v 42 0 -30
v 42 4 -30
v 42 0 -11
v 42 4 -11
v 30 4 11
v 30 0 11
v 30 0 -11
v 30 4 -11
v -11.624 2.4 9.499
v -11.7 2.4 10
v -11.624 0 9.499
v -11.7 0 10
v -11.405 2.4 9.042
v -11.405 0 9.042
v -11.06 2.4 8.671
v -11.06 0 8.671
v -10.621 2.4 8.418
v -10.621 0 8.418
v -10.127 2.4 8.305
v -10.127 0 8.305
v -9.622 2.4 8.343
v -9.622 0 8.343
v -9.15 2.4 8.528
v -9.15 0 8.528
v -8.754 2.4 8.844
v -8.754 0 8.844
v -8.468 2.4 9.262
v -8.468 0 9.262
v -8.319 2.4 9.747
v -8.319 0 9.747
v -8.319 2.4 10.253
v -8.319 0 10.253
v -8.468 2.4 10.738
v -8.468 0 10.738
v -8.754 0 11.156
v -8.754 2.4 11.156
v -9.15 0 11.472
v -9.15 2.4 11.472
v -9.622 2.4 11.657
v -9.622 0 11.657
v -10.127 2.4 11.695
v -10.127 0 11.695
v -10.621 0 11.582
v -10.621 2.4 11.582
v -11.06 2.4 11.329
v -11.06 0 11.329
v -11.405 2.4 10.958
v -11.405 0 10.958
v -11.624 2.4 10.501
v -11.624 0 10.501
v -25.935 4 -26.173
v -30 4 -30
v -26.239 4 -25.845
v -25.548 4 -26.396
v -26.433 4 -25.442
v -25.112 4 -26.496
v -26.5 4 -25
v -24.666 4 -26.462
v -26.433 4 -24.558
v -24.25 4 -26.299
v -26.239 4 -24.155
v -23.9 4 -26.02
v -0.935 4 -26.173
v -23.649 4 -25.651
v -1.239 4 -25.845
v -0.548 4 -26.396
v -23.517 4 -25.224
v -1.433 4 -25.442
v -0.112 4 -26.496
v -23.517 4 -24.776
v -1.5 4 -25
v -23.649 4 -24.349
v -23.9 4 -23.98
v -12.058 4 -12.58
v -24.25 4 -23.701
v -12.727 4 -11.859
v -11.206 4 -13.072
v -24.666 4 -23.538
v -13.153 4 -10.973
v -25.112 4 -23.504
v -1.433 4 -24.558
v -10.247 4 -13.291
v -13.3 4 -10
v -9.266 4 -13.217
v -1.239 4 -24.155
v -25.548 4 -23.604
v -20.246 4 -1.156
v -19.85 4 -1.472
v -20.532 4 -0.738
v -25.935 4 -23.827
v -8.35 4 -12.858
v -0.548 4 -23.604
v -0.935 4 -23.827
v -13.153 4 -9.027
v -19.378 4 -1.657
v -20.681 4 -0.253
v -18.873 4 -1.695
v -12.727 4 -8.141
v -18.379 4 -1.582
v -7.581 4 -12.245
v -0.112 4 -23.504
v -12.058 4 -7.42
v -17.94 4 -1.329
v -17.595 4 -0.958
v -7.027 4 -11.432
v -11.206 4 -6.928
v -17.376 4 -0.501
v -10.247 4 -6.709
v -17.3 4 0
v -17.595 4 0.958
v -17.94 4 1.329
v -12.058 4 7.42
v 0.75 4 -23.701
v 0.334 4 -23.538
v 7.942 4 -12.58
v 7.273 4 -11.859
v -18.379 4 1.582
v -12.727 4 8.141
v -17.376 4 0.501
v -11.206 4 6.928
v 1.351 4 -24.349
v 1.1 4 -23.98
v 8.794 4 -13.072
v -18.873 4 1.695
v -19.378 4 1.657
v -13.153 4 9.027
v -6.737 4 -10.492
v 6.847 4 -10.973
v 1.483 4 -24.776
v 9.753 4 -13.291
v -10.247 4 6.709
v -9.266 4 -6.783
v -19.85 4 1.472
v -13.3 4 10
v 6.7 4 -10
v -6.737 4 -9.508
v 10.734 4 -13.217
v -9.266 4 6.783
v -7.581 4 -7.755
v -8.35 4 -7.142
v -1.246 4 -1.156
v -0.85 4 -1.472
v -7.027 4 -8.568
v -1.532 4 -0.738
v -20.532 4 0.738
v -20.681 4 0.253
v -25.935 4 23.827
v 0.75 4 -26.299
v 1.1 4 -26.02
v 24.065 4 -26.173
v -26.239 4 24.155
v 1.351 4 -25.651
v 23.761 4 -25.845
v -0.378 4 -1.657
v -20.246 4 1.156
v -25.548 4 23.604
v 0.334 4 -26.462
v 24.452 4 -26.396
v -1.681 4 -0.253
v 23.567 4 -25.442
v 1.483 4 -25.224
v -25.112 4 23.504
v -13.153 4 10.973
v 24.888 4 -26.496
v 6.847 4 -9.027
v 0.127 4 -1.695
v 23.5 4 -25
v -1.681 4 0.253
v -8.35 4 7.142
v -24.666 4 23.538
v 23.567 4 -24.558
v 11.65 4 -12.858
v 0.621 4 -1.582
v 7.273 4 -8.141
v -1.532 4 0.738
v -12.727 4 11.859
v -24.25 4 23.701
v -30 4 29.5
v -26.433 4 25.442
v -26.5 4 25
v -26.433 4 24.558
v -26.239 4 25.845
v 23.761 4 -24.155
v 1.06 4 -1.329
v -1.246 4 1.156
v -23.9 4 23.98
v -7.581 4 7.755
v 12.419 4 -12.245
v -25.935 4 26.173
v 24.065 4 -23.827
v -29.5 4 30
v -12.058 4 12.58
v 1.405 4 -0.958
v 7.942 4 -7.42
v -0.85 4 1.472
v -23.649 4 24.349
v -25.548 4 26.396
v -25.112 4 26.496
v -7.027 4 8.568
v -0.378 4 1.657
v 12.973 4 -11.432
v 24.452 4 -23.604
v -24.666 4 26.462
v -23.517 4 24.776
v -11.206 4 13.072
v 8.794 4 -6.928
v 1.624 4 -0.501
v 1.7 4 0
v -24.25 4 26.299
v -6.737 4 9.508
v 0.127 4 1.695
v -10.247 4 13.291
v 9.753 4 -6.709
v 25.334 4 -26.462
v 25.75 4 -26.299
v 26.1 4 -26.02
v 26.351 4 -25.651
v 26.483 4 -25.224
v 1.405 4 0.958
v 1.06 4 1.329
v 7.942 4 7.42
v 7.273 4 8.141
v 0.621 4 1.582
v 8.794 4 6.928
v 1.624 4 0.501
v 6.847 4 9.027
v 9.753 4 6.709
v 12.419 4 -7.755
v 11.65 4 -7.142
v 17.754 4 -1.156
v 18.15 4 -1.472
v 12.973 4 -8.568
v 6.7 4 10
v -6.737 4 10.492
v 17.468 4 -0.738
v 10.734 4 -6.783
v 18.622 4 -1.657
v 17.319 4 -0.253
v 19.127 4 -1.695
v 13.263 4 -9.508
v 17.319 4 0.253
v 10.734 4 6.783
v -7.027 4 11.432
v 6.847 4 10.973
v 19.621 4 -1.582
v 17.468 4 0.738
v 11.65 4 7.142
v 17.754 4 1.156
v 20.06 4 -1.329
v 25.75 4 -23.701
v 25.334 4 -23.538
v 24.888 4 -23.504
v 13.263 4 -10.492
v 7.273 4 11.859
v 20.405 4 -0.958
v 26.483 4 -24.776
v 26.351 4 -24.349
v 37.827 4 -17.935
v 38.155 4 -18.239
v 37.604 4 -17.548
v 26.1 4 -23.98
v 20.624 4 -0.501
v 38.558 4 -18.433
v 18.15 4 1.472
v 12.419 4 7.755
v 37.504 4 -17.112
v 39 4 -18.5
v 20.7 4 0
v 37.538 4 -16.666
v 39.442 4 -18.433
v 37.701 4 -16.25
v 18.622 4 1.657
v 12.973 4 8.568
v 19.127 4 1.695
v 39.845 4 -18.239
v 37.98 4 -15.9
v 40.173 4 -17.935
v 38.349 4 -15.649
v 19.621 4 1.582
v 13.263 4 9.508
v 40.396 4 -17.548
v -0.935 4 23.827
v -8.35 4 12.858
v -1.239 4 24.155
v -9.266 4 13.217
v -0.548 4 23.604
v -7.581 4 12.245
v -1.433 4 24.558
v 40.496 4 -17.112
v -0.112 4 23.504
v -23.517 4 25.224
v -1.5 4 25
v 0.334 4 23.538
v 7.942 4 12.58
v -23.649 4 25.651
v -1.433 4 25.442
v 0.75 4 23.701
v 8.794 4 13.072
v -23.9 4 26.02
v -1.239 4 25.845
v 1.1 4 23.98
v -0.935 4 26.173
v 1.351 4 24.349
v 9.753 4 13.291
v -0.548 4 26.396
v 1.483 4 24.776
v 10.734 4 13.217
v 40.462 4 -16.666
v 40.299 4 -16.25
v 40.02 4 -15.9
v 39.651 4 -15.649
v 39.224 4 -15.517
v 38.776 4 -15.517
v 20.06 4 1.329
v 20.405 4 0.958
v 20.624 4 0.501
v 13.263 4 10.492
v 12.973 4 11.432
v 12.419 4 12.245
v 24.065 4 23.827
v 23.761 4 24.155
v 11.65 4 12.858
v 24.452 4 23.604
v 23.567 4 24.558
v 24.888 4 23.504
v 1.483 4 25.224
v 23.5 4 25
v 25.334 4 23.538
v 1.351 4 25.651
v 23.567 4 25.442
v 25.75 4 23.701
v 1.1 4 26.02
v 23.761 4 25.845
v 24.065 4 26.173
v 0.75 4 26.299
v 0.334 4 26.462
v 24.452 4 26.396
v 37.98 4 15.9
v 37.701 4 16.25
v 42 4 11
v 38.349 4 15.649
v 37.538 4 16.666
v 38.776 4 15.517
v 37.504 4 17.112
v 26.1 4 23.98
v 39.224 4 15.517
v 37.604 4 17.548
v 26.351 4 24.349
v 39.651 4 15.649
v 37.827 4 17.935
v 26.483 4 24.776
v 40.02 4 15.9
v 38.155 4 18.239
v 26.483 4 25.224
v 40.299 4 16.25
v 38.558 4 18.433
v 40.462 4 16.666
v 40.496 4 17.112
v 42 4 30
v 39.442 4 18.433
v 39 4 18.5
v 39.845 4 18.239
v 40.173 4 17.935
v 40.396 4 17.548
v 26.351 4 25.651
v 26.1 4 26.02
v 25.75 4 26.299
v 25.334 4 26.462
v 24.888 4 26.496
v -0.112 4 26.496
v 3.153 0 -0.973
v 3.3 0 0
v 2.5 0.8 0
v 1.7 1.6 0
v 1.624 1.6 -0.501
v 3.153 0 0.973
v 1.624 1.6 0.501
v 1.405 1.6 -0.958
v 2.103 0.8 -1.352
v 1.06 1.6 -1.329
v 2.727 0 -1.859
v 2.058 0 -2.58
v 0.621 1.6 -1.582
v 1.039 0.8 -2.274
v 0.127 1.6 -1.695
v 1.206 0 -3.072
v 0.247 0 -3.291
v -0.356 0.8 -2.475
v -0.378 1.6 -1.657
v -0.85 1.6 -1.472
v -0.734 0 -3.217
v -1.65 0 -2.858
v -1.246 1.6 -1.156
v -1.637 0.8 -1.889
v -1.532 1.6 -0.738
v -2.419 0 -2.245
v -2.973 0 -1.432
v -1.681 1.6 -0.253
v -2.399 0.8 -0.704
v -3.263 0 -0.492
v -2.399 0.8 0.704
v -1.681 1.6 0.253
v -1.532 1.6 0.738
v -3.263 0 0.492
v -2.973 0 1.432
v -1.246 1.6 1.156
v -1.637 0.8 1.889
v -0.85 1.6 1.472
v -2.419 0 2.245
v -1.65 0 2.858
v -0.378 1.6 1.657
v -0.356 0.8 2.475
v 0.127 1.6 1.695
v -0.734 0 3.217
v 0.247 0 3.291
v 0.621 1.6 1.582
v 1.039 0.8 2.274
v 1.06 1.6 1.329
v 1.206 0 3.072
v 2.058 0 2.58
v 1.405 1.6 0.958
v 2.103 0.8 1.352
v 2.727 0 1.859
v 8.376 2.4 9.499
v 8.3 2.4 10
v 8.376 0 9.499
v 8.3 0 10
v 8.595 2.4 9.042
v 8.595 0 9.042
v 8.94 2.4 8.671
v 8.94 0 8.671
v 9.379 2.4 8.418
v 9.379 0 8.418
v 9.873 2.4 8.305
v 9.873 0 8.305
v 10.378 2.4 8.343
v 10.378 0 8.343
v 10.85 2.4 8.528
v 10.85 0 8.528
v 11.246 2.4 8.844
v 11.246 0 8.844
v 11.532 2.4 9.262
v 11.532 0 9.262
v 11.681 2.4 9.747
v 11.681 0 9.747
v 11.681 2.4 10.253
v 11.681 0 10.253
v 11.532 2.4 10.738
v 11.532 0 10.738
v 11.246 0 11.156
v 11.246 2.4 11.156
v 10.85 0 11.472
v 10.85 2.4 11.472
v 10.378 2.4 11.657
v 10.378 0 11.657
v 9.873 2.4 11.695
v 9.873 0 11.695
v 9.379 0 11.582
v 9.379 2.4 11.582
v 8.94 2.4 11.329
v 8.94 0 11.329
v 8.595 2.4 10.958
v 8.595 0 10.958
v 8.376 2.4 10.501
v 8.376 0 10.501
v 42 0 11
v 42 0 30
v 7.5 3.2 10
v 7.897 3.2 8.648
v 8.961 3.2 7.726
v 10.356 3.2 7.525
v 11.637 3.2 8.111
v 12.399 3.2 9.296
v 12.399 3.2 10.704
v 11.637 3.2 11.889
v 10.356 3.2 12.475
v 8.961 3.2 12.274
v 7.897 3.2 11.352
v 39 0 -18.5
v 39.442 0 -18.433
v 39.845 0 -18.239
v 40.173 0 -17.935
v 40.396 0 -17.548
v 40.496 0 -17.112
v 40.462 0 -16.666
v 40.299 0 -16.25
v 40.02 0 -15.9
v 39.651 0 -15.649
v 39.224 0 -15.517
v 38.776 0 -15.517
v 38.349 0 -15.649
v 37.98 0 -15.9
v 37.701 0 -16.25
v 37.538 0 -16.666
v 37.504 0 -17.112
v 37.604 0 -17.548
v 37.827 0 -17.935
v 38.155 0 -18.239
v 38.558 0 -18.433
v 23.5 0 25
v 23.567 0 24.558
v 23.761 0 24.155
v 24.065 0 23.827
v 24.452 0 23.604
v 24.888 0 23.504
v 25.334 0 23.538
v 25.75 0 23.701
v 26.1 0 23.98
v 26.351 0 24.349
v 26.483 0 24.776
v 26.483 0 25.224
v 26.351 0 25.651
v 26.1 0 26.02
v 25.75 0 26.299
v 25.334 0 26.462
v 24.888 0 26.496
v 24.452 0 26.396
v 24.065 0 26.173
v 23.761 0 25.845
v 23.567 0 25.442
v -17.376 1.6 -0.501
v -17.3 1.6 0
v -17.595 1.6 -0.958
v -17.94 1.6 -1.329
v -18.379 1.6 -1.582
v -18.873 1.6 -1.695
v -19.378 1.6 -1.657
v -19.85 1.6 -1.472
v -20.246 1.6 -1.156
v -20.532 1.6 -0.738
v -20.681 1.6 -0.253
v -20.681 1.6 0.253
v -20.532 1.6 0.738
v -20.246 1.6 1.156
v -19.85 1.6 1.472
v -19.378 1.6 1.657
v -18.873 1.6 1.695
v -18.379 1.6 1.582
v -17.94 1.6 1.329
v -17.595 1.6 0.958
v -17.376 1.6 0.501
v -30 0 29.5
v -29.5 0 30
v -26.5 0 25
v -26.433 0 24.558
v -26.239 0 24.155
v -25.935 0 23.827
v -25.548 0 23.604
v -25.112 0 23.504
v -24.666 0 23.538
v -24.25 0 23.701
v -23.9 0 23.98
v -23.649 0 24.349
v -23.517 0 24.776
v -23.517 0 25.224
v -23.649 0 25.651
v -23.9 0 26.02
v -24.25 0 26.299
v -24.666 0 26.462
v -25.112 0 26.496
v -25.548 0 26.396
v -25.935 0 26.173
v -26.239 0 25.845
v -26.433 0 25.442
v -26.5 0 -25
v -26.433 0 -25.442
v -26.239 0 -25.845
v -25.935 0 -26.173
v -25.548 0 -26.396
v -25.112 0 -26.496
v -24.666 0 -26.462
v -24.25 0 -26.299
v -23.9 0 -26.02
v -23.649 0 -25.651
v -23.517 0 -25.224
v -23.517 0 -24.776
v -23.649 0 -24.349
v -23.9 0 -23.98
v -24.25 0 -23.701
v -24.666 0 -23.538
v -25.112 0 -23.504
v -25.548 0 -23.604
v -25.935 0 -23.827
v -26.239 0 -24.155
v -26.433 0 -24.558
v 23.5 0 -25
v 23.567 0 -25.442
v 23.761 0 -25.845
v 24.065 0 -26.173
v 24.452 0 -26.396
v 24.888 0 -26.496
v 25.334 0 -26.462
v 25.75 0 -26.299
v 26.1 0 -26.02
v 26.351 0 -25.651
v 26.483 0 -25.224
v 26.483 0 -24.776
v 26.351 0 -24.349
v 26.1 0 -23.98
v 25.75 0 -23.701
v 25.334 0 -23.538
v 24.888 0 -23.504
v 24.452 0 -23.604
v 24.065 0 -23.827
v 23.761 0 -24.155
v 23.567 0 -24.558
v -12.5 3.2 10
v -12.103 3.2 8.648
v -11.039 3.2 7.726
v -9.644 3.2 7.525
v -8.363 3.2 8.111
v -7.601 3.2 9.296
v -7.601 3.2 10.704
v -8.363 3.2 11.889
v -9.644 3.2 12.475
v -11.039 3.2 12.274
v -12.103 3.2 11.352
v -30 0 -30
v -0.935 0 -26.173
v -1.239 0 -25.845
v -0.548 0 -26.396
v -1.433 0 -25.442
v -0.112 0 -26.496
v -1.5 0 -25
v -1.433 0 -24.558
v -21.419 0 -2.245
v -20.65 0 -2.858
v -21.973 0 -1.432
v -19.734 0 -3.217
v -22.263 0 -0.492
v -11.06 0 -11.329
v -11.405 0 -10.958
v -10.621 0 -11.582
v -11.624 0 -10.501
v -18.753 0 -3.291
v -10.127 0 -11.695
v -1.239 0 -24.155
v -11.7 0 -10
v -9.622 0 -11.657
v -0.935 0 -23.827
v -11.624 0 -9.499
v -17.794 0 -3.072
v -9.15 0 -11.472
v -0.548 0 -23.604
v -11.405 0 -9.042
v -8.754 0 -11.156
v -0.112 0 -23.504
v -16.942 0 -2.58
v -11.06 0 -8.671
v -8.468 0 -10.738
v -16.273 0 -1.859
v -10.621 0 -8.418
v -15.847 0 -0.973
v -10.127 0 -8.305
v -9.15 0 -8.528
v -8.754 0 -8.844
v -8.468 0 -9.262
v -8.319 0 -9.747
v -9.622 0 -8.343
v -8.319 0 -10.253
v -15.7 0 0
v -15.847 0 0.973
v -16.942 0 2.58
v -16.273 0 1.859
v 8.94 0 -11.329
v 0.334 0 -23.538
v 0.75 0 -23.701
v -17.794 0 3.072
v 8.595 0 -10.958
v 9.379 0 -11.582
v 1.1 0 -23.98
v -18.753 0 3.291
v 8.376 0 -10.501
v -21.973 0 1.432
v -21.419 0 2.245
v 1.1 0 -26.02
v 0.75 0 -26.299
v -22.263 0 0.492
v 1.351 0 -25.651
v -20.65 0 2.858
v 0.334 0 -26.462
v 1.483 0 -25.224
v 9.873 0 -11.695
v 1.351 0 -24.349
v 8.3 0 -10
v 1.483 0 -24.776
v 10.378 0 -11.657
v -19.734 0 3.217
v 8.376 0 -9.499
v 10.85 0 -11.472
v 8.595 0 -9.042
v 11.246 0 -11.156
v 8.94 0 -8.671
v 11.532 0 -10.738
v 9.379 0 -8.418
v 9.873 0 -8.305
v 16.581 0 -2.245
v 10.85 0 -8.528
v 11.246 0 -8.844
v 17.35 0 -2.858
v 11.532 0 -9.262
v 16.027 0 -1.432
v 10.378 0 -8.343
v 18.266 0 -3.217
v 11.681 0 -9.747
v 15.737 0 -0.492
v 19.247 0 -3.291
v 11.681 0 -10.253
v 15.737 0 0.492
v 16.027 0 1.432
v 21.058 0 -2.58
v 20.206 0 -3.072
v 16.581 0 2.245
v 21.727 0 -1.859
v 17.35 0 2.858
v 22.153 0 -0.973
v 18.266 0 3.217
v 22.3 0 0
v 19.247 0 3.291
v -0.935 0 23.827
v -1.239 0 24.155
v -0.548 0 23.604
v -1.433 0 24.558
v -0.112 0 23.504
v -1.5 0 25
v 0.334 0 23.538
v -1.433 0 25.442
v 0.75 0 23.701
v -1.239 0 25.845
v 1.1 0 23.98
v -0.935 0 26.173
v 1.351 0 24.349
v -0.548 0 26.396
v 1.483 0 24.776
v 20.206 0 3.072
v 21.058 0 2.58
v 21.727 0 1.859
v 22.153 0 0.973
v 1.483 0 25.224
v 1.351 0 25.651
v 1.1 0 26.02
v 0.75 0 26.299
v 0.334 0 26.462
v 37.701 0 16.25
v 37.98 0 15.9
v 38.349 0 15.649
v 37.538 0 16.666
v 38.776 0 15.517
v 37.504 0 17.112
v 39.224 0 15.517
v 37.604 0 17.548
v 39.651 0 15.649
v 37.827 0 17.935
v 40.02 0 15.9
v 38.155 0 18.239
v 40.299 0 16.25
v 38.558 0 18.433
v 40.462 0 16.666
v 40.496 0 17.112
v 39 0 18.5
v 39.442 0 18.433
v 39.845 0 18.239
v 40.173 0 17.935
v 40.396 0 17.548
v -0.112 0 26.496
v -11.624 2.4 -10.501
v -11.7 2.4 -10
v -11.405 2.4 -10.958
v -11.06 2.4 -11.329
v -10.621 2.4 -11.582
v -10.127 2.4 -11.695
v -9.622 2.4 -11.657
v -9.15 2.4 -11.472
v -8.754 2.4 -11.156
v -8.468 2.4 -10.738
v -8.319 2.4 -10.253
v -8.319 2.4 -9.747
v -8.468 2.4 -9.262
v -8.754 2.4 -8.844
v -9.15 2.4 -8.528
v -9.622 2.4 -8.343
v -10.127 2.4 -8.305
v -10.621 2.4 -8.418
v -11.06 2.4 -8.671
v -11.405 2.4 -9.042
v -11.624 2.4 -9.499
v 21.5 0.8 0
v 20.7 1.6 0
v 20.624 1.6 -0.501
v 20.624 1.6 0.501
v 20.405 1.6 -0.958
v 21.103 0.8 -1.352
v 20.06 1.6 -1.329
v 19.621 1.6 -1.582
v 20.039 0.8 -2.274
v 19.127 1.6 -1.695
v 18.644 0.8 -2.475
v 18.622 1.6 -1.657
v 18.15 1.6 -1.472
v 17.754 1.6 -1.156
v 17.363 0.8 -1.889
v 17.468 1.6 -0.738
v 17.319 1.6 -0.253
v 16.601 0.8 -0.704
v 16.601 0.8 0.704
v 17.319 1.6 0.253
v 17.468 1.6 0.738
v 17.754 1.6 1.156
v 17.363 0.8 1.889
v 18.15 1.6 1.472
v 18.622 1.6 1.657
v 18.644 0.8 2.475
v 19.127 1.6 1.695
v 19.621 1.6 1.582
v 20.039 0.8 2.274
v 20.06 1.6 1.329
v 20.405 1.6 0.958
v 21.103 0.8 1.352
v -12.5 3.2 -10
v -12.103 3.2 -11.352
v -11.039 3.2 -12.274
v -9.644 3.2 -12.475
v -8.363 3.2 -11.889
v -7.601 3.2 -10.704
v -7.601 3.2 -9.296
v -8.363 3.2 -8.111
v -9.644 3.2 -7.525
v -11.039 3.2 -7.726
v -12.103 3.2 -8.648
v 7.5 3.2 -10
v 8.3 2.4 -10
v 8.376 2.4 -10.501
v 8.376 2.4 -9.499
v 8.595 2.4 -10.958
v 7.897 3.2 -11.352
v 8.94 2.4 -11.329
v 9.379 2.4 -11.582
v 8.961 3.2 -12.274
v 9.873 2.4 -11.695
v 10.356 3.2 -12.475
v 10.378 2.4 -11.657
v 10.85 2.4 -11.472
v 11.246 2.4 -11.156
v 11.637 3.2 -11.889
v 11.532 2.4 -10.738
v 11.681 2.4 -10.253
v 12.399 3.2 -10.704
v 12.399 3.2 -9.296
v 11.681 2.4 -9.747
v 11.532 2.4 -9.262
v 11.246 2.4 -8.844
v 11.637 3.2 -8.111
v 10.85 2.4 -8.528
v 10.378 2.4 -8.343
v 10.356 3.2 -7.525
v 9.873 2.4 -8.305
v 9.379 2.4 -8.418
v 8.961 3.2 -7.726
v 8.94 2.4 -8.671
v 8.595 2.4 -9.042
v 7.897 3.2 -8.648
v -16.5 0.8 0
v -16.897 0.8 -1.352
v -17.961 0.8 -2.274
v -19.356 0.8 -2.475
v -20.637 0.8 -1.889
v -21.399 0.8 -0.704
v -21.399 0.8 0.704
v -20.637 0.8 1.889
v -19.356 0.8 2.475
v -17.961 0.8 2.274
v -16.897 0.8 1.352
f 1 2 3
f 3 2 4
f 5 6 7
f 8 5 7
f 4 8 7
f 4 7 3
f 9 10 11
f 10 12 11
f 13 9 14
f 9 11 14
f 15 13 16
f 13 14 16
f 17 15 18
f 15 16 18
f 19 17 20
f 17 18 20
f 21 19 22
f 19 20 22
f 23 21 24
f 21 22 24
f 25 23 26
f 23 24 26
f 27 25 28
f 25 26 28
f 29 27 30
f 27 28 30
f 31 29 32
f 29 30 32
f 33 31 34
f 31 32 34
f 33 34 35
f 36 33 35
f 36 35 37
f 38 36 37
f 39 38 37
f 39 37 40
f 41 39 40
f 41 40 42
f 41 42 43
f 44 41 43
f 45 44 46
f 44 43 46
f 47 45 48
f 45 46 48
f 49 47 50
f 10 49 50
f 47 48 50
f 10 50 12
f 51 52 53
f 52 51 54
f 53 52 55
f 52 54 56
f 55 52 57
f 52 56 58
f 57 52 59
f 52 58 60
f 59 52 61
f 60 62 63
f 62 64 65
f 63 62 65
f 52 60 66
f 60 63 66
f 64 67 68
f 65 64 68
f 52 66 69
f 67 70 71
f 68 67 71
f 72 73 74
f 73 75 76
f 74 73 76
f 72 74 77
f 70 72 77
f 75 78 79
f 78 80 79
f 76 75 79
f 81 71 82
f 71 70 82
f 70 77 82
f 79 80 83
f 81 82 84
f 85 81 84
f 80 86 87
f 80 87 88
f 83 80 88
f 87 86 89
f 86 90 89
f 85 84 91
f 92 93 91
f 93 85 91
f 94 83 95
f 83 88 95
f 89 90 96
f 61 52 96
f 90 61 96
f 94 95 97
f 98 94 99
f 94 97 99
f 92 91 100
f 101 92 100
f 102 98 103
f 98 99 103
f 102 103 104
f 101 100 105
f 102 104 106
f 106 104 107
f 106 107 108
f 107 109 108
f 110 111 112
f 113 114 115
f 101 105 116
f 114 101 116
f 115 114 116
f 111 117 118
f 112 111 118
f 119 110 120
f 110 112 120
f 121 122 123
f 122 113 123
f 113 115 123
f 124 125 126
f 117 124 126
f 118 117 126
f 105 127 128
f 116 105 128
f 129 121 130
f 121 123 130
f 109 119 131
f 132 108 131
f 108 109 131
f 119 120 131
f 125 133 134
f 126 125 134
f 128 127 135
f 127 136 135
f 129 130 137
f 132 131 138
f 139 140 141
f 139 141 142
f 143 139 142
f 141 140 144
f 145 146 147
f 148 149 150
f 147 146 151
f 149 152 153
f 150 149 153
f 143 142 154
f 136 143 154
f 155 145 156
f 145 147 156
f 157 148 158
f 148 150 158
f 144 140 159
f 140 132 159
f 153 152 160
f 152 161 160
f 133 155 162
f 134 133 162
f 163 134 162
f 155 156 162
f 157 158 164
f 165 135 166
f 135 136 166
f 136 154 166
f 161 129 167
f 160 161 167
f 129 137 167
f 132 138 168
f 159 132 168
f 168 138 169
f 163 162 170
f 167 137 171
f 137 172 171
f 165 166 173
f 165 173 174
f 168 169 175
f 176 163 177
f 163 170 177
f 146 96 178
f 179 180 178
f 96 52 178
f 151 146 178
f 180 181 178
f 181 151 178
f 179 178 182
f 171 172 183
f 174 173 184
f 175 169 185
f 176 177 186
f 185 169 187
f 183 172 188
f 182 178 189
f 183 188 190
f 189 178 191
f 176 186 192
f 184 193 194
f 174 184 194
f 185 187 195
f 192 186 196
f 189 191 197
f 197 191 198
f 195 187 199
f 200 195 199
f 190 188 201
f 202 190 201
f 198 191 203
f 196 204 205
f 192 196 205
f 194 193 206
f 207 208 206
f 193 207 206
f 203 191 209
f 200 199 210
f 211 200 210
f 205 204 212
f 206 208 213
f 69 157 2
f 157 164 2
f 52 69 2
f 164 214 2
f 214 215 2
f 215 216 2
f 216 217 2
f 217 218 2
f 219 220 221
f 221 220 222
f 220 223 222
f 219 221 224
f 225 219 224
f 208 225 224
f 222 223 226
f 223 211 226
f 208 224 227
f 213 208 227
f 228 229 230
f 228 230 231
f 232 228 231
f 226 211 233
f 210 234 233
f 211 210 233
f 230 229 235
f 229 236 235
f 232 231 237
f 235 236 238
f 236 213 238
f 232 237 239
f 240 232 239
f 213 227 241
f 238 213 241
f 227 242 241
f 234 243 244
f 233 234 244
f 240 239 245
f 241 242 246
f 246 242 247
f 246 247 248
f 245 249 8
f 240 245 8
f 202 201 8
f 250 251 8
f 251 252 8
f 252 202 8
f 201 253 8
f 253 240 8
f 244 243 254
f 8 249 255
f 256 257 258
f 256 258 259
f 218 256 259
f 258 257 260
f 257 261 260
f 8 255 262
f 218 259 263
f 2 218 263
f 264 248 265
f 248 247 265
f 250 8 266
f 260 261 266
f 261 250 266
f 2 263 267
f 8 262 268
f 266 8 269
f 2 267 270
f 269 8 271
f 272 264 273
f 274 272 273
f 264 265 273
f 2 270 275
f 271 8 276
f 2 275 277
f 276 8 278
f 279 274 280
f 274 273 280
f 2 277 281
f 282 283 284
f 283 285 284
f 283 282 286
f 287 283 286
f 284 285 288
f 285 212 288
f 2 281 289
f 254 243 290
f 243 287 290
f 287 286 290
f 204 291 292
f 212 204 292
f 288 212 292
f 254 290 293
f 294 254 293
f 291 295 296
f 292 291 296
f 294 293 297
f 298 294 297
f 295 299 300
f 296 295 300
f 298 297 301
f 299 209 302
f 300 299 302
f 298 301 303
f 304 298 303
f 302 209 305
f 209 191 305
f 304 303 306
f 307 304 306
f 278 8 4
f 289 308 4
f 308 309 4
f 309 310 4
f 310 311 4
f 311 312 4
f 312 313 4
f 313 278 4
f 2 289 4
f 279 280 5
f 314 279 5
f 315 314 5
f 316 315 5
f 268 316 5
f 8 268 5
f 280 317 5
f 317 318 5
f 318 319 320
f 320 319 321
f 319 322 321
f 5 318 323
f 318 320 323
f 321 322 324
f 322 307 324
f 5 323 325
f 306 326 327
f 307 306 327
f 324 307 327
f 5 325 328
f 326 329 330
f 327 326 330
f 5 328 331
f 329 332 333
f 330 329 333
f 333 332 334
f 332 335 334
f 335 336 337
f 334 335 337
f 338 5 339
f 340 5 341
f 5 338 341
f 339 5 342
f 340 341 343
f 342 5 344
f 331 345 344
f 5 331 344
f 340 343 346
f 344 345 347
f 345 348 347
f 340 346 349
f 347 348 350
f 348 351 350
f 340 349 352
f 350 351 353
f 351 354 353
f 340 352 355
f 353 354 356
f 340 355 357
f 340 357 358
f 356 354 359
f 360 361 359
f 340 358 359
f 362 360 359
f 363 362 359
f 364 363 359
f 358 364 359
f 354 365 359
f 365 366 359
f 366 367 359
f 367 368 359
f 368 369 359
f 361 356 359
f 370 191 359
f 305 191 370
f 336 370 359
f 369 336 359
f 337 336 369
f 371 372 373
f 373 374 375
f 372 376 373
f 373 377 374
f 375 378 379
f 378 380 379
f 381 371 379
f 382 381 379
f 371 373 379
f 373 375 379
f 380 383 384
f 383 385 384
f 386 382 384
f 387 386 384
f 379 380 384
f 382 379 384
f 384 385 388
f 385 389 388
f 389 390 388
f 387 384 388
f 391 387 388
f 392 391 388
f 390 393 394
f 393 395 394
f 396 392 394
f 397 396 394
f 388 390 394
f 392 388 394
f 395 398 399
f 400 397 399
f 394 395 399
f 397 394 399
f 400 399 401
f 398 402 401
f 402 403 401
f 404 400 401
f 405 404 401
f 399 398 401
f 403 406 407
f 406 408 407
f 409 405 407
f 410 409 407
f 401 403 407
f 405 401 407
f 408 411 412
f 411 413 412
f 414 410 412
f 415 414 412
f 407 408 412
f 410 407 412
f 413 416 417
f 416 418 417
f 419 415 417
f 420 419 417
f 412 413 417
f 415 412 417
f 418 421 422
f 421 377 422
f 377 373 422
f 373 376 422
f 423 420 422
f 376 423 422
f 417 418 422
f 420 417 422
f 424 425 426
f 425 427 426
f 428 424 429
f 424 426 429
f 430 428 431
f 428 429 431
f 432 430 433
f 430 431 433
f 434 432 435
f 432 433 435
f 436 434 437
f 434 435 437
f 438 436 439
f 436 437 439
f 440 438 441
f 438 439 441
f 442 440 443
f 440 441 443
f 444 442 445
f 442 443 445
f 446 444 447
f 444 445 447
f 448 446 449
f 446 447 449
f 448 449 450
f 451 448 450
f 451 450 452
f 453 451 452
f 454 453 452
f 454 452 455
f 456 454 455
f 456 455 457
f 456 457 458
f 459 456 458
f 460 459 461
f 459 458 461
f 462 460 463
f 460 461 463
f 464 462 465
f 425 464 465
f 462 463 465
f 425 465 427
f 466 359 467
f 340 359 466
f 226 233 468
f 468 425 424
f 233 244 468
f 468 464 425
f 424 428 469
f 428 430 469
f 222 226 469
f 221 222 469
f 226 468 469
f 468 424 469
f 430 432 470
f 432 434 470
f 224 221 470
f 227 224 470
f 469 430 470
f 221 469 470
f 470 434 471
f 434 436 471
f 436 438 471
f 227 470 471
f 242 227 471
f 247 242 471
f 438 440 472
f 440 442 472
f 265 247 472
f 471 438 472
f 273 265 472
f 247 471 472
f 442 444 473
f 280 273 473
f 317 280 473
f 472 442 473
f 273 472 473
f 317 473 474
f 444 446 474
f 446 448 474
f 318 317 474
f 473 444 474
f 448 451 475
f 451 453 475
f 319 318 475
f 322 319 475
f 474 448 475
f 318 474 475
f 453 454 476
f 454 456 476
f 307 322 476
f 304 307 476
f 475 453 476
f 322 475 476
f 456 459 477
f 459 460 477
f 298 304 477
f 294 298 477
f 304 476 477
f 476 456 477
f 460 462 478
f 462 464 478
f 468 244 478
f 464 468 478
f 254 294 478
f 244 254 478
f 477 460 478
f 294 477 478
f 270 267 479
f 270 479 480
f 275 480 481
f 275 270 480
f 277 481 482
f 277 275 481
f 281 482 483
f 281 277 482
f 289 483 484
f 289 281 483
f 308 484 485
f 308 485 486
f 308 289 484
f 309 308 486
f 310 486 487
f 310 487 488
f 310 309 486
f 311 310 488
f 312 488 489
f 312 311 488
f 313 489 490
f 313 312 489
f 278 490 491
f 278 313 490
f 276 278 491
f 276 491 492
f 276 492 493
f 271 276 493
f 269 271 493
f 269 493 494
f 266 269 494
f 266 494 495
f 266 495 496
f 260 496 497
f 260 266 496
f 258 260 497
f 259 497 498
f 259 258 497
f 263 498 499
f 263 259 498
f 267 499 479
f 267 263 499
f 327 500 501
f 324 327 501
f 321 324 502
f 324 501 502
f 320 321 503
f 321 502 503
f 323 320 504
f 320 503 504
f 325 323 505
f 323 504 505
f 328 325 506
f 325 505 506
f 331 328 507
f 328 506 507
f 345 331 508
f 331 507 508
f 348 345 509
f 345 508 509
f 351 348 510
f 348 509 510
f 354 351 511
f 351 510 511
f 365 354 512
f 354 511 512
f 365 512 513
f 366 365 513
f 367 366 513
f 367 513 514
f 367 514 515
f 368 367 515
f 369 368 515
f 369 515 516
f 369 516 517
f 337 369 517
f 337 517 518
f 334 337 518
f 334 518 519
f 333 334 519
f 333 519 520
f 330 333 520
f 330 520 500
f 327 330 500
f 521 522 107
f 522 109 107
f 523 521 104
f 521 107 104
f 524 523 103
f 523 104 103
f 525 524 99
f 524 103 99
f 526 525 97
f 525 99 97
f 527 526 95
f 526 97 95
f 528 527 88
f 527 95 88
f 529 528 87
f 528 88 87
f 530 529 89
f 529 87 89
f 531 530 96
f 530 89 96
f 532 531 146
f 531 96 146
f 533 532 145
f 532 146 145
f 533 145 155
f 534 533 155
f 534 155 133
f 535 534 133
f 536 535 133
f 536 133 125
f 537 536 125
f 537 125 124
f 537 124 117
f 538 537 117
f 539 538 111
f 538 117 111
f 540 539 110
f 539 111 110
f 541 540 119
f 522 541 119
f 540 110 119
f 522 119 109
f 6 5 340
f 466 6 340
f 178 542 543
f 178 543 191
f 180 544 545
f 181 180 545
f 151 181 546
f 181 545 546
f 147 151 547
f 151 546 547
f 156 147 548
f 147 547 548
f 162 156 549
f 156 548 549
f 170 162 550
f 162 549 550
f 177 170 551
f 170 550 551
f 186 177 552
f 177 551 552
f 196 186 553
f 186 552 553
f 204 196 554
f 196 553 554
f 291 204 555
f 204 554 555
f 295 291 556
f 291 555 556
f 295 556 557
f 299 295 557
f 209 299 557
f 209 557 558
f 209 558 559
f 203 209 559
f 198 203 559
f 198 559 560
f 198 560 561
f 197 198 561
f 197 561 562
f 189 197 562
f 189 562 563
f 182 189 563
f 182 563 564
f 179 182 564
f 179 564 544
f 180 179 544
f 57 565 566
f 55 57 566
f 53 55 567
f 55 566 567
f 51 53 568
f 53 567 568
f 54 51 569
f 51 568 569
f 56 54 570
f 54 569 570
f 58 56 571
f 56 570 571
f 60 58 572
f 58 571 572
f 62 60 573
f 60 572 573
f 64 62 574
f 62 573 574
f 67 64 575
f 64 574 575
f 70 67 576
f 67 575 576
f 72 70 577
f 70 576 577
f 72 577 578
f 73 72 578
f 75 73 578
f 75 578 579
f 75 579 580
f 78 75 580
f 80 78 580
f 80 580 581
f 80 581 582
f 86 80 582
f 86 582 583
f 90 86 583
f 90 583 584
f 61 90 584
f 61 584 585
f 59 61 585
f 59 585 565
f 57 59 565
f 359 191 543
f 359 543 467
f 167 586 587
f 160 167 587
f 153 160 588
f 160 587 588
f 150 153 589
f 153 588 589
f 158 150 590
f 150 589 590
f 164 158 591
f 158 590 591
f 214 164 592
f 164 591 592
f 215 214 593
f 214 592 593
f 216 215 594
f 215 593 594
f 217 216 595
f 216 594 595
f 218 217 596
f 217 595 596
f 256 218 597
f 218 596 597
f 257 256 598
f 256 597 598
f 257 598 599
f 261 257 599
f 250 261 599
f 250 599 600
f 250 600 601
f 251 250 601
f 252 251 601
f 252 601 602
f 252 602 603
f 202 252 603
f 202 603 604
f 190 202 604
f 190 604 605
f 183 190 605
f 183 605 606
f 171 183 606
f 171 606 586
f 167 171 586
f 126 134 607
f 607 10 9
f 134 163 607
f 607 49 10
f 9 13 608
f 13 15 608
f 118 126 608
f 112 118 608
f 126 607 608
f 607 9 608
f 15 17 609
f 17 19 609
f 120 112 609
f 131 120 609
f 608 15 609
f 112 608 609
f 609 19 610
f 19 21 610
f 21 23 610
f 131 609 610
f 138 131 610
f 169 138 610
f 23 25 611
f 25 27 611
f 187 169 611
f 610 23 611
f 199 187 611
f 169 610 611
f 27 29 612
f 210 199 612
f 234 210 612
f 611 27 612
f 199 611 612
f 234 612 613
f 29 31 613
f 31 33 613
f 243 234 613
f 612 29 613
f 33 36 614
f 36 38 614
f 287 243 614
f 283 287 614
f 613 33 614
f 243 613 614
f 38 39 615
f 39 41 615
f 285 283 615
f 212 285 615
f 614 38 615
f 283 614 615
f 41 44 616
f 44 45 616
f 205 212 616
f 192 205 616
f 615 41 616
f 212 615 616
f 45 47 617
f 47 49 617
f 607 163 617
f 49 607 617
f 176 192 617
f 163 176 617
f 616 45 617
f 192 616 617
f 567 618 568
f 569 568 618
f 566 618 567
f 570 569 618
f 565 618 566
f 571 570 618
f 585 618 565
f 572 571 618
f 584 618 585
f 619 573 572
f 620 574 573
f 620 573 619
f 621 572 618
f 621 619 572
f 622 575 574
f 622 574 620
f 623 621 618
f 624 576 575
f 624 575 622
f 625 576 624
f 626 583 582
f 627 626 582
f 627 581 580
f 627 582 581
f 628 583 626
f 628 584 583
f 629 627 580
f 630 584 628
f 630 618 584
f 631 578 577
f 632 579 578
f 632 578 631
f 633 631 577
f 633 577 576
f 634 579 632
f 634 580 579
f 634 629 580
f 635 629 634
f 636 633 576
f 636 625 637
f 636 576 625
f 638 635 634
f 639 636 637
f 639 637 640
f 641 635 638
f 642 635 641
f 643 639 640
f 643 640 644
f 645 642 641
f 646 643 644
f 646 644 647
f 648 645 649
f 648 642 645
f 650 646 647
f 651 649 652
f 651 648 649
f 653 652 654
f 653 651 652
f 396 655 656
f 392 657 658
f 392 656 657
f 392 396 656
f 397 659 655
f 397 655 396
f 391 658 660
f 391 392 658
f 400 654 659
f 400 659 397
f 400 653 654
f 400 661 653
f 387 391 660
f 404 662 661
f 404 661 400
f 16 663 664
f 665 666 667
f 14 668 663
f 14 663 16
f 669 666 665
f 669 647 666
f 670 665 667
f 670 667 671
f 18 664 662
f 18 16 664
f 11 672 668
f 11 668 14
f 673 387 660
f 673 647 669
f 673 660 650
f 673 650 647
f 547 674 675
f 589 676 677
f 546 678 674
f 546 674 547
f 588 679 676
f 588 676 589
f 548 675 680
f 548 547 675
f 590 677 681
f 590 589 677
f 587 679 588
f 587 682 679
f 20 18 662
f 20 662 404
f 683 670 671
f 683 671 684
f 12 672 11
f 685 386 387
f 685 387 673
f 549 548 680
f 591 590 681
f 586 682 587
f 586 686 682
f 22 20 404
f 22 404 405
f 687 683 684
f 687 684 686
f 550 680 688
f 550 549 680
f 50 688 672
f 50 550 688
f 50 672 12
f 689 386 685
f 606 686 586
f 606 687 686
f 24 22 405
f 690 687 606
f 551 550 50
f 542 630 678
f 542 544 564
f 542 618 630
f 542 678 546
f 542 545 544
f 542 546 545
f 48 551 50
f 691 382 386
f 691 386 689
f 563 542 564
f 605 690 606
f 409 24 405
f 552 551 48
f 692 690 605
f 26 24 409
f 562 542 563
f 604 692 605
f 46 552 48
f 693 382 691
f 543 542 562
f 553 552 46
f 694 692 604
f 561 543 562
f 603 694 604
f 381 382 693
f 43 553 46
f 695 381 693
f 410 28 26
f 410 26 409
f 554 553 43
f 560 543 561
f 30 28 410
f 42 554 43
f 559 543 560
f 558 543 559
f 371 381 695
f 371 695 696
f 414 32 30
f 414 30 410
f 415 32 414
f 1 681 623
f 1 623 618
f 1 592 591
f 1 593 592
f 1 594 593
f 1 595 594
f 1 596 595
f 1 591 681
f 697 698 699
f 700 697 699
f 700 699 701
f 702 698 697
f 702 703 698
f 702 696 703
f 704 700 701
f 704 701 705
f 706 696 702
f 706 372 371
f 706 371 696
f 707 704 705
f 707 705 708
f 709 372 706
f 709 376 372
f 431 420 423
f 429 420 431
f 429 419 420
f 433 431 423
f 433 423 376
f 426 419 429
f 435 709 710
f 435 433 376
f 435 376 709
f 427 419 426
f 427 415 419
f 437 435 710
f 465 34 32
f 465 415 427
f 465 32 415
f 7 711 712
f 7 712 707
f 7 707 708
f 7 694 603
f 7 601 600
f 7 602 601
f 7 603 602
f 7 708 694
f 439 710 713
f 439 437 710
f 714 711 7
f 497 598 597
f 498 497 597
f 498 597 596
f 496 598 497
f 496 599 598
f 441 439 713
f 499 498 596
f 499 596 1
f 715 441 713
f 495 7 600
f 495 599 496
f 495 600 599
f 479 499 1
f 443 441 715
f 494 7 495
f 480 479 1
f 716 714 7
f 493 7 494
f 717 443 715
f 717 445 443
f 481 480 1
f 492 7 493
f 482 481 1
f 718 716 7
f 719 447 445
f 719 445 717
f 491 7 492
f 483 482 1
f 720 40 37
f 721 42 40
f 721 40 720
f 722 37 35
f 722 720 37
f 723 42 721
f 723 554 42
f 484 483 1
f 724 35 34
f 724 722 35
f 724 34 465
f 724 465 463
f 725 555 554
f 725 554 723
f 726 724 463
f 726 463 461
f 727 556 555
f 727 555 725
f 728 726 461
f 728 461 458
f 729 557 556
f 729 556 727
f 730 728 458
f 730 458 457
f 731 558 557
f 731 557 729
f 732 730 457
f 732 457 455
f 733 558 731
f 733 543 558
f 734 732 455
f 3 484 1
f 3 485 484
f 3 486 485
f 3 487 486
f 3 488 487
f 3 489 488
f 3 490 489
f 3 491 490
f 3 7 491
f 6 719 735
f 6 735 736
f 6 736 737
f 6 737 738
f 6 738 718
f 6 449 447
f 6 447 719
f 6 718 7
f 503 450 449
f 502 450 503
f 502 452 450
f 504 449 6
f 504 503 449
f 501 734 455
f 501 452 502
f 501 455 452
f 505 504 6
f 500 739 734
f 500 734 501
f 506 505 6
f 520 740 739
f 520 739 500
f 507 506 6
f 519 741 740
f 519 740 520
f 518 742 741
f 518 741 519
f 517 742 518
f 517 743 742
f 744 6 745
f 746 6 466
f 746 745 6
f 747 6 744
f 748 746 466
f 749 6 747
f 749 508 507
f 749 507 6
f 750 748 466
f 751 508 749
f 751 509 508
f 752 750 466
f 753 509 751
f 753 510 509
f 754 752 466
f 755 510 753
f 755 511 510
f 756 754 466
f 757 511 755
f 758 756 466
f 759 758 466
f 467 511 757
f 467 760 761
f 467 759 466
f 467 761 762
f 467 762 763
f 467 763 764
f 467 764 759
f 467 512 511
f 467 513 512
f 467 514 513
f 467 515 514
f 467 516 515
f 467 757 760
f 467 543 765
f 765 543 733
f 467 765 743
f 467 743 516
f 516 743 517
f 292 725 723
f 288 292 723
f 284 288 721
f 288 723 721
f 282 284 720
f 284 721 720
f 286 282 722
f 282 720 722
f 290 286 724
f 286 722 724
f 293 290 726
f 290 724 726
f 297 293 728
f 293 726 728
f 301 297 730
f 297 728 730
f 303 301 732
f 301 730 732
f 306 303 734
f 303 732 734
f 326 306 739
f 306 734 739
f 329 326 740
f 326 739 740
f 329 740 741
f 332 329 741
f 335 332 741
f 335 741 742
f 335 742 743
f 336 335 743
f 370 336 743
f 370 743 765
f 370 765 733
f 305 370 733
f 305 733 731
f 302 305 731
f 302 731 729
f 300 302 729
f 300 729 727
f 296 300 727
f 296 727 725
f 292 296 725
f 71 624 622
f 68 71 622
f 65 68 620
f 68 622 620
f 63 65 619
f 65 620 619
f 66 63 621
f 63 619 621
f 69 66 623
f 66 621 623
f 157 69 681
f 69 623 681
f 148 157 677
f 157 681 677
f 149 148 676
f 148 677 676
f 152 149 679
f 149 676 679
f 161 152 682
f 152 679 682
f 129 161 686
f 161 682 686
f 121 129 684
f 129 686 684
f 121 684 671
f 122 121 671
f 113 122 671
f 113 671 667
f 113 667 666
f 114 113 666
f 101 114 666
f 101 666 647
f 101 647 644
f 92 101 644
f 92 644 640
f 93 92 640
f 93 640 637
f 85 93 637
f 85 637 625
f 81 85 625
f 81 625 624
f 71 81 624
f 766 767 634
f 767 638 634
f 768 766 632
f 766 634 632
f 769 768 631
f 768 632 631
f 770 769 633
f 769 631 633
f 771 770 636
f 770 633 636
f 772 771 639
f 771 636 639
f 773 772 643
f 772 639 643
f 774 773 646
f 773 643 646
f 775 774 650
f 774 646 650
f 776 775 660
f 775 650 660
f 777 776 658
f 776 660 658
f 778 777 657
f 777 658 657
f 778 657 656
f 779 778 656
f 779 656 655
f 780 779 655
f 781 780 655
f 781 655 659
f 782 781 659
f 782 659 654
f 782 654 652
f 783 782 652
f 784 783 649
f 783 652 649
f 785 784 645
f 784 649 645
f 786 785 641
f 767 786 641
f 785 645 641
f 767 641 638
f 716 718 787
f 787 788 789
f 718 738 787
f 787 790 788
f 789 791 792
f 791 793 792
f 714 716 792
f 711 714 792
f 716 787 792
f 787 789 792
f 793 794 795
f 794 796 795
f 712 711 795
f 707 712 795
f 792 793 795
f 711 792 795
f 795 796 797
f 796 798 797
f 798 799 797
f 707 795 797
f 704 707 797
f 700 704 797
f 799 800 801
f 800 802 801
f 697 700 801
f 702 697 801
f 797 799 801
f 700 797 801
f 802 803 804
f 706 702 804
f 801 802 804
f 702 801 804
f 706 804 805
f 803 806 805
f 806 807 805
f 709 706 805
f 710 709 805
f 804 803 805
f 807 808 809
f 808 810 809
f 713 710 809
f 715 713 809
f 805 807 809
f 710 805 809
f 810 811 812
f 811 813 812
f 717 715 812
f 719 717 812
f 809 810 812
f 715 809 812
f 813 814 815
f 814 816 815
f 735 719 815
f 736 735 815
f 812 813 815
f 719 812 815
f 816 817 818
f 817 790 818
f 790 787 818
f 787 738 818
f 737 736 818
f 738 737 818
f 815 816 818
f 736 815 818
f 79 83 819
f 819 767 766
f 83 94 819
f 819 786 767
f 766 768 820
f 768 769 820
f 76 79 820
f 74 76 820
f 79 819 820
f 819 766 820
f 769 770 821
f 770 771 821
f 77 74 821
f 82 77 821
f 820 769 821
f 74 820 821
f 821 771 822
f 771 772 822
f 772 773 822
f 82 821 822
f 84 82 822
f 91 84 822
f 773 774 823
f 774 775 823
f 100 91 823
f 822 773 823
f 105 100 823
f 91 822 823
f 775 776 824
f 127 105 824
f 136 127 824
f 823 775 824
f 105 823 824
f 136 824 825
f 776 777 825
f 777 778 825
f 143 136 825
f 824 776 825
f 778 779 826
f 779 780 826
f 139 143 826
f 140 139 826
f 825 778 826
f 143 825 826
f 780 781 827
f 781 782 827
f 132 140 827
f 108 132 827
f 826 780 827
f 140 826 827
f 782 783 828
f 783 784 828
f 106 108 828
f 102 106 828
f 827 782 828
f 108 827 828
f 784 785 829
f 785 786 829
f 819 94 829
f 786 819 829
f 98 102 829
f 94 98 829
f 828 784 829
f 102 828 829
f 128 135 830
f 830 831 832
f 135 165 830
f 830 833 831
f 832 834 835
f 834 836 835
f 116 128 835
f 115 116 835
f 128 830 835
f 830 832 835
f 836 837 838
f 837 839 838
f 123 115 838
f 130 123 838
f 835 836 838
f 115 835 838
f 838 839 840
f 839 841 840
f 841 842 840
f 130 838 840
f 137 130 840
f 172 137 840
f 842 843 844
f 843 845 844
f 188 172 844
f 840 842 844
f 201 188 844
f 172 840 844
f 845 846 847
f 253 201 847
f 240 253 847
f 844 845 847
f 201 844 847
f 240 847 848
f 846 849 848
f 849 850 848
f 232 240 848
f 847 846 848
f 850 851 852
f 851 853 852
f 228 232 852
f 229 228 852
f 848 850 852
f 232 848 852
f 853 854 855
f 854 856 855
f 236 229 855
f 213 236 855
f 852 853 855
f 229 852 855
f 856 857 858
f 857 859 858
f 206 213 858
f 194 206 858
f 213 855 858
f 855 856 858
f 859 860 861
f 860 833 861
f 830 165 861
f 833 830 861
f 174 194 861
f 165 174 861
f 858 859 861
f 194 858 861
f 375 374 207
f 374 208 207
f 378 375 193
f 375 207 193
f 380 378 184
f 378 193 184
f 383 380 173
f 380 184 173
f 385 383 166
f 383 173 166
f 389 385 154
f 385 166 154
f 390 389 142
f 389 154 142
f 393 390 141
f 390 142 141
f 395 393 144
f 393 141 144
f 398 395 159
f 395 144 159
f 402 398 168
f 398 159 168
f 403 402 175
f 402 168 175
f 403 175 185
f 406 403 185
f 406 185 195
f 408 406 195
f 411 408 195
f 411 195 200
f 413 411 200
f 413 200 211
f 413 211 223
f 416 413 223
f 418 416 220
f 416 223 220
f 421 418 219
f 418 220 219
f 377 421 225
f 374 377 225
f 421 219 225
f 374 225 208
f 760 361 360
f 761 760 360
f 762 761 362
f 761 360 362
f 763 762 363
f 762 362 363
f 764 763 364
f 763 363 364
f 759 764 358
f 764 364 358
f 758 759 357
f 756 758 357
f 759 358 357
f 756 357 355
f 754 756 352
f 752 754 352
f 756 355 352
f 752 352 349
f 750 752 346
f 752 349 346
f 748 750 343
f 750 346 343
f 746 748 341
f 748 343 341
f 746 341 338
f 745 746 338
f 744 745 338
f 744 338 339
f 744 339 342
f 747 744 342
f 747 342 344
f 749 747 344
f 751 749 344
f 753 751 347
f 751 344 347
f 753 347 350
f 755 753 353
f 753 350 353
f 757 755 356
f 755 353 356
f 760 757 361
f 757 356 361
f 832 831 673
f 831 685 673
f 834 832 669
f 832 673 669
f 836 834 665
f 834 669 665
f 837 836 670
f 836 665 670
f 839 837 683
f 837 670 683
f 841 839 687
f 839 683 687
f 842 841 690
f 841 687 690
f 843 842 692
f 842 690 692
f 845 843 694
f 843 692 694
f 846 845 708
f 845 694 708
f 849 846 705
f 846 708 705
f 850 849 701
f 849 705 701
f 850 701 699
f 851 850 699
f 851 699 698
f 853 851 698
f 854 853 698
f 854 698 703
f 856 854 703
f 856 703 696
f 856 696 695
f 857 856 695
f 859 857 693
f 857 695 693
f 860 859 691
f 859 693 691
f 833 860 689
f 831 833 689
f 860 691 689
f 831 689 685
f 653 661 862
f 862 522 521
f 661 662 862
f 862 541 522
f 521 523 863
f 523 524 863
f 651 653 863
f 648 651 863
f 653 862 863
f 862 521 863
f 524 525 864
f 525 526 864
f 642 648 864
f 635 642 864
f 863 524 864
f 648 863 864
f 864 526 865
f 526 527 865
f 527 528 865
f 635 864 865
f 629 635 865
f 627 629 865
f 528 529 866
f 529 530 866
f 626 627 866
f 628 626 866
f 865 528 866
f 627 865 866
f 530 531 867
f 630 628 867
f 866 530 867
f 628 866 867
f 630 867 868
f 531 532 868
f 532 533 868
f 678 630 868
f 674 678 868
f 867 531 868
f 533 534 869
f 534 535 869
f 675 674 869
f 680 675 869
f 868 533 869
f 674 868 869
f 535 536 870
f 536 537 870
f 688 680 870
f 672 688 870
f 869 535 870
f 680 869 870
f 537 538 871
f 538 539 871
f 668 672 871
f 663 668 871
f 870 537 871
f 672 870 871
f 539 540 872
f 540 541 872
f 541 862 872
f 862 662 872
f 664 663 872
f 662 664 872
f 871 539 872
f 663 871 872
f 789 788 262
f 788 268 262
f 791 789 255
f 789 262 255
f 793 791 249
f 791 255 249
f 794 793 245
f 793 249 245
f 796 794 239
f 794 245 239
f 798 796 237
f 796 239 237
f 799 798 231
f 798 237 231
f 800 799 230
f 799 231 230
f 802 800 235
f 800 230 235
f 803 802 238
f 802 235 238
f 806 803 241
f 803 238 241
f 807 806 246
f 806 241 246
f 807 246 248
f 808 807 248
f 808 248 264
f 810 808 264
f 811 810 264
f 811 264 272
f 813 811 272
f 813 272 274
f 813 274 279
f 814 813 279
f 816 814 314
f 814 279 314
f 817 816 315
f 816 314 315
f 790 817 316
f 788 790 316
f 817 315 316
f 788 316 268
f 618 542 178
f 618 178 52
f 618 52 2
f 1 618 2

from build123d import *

# Parameters (mm, degrees)
SKETCH_1_W                   = 60
SKETCH_1_H                   = 60
EXTRUDE_1_DEPTH              = 4
HOLE_WIZARD_M3_1_D           = 3.4
HOLE_WIZARD_M3_1_CSINK_D     = 6.6
HOLE_WIZARD_M3_1_CSINK_ANGLE = 90
HOLE_WIZARD_M3_2_D           = 3.4
HOLE_WIZARD_M3_2_CSINK_D     = 6.6
HOLE_WIZARD_M3_2_CSINK_ANGLE = 90
HOLE_WIZARD_1_D              = 3
SKETCH_9_W                   = 12
SKETCH_9_H                   = 19
SKETCH_9_R                   = 1.5
EXTRUDE_3_DEPTH              = 4
CHAMFER_1_SIZE               = 0.5


with BuildPart() as part:
    # 草图1 → 凸台-拉伸1 (new body)
    with BuildSketch(Plane(origin=(0, 0, 0), x_dir=(1, 0, 0), z_dir=(0, 1, 0))):
        Rectangle(SKETCH_1_W, SKETCH_1_H)
    extrude(amount=EXTRUDE_1_DEPTH)

    # M3 十字槽沉头木螺钉的锥形沉头孔1 (through all)
    with Locations(Plane(origin=(0, 4, 0), x_dir=(1, 0, 0), z_dir=(0, 1, 0))):
        with Locations((-10, 10), (10, 10), (10, -10), (-10, -10)):
            CounterSinkHole(HOLE_WIZARD_M3_1_D / 2, HOLE_WIZARD_M3_1_CSINK_D / 2, counter_sink_angle=HOLE_WIZARD_M3_1_CSINK_ANGLE)

    # M3 十字槽沉头木螺钉的锥形沉头孔2 (through all)
    with Locations(Plane(origin=(0, 0, 0), x_dir=(-1, 0, 0), z_dir=(0, -1, 0))):
        with Locations((19, 0), (0, 0), (-19, 0)):
            CounterSinkHole(HOLE_WIZARD_M3_2_D / 2, HOLE_WIZARD_M3_2_CSINK_D / 2, counter_sink_angle=HOLE_WIZARD_M3_2_CSINK_ANGLE)

    # 孔1 (through all)
    with Locations(Plane(origin=(0, 4, 0), x_dir=(1, 0, 0), z_dir=(0, 1, 0))):
        with Locations((25, 25), (25, -25), (0, -25), (-25, -25), (-25, 25), (0, 25)):
            Hole(HOLE_WIZARD_1_D / 2)

    # 草图9 → 凸台-拉伸3 (add)
    with BuildSketch(Plane(origin=(0, 4, 0), x_dir=(1, 0, 0), z_dir=(0, 1, 0))):
        with Locations((36, -20.5)):
            Rectangle(SKETCH_9_W, SKETCH_9_H)
        with Locations(Location((39, -17, 0), (0, 0, 270))):
            Circle(SKETCH_9_R, mode=Mode.SUBTRACT)
    extrude_3 = extrude(amount=-EXTRUDE_3_DEPTH)

    # 倒角1
    chamfer_1_edges = [part.edges().sort_by_distance(p)[0] for p in [
        (-30, 2, 30),
    ]]
    chamfer(chamfer_1_edges, length=CHAMFER_1_SIZE)

    # 镜向1: 凸台-拉伸3 across plane
    add(extrude_3.mirror(Plane.XY))


solid = part.part
